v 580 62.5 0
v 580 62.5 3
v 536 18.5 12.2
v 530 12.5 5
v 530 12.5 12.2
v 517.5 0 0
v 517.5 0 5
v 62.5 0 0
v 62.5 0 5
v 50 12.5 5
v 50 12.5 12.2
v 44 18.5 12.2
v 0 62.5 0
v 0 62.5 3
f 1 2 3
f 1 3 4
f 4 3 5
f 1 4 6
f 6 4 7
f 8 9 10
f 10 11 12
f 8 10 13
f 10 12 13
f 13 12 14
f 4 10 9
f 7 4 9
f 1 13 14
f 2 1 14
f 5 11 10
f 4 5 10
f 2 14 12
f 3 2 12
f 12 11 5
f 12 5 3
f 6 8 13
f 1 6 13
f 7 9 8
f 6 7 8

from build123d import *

# Parameters (mm, degrees)
F0_W     = 12.5
F0_H     = 3
F0_W_2   = 6
F0_H_2   = 2
F0_W_3   = 44
F0_H_3   = 6
F0_H_4   = 1.2
F1_DEPTH = 580
F3_DEPTH = 50
F5_DEPTH = 50


with BuildPart() as f1:
    # F0 (on Right) → F1 (new body)
    with BuildSketch(Plane.YZ):
        with Locations((6.25, 1.5)):
            Rectangle(F0_W, F0_H)
        with Locations((15.5, 1.5)):
            Rectangle(F0_W_2, F0_H)
        with Locations((6.25, 4)):
            Rectangle(F0_W, F0_H_2)
        with Locations((40.5, 1.5)):
            Rectangle(F0_W_3, F0_H)
        with Locations((15.5, 4)):
            Rectangle(F0_W_2, F0_H_2)
        Polygon((18.5, 5), (18.5, 3), (62.5, 3), (52.9347826087, 5), align=None)
        with Locations((15.5, 8)):
            Rectangle(F0_W_2, F0_H_3)
        Polygon((18.5, 11), (18.5, 5), (52.9347826087, 5), (24.2391304348, 11), align=None)
        with Locations((15.5, 11.6)):
            Rectangle(F0_W_2, F0_H_4)
        Polygon((18.5, 12.2), (18.5, 11), (24.2391304348, 11), align=None)
    extrude(amount=F1_DEPTH)

    # F2 (on Top) → F3 (cut, symmetric)
    with BuildSketch(Plane.XY):
        Polygon((0, 62.5), (0, 0), (62.5, 0), align=None)
    extrude(amount=F3_DEPTH, both=True, mode=Mode.SUBTRACT)

    # F4 (on Top) → F5 (cut, symmetric)
    with BuildSketch(Plane.XY):
        Polygon((580, 62.5), (517.5, 0), (580, 0), align=None)
    extrude(amount=F5_DEPTH, both=True, mode=Mode.SUBTRACT)


solid = f1.part
